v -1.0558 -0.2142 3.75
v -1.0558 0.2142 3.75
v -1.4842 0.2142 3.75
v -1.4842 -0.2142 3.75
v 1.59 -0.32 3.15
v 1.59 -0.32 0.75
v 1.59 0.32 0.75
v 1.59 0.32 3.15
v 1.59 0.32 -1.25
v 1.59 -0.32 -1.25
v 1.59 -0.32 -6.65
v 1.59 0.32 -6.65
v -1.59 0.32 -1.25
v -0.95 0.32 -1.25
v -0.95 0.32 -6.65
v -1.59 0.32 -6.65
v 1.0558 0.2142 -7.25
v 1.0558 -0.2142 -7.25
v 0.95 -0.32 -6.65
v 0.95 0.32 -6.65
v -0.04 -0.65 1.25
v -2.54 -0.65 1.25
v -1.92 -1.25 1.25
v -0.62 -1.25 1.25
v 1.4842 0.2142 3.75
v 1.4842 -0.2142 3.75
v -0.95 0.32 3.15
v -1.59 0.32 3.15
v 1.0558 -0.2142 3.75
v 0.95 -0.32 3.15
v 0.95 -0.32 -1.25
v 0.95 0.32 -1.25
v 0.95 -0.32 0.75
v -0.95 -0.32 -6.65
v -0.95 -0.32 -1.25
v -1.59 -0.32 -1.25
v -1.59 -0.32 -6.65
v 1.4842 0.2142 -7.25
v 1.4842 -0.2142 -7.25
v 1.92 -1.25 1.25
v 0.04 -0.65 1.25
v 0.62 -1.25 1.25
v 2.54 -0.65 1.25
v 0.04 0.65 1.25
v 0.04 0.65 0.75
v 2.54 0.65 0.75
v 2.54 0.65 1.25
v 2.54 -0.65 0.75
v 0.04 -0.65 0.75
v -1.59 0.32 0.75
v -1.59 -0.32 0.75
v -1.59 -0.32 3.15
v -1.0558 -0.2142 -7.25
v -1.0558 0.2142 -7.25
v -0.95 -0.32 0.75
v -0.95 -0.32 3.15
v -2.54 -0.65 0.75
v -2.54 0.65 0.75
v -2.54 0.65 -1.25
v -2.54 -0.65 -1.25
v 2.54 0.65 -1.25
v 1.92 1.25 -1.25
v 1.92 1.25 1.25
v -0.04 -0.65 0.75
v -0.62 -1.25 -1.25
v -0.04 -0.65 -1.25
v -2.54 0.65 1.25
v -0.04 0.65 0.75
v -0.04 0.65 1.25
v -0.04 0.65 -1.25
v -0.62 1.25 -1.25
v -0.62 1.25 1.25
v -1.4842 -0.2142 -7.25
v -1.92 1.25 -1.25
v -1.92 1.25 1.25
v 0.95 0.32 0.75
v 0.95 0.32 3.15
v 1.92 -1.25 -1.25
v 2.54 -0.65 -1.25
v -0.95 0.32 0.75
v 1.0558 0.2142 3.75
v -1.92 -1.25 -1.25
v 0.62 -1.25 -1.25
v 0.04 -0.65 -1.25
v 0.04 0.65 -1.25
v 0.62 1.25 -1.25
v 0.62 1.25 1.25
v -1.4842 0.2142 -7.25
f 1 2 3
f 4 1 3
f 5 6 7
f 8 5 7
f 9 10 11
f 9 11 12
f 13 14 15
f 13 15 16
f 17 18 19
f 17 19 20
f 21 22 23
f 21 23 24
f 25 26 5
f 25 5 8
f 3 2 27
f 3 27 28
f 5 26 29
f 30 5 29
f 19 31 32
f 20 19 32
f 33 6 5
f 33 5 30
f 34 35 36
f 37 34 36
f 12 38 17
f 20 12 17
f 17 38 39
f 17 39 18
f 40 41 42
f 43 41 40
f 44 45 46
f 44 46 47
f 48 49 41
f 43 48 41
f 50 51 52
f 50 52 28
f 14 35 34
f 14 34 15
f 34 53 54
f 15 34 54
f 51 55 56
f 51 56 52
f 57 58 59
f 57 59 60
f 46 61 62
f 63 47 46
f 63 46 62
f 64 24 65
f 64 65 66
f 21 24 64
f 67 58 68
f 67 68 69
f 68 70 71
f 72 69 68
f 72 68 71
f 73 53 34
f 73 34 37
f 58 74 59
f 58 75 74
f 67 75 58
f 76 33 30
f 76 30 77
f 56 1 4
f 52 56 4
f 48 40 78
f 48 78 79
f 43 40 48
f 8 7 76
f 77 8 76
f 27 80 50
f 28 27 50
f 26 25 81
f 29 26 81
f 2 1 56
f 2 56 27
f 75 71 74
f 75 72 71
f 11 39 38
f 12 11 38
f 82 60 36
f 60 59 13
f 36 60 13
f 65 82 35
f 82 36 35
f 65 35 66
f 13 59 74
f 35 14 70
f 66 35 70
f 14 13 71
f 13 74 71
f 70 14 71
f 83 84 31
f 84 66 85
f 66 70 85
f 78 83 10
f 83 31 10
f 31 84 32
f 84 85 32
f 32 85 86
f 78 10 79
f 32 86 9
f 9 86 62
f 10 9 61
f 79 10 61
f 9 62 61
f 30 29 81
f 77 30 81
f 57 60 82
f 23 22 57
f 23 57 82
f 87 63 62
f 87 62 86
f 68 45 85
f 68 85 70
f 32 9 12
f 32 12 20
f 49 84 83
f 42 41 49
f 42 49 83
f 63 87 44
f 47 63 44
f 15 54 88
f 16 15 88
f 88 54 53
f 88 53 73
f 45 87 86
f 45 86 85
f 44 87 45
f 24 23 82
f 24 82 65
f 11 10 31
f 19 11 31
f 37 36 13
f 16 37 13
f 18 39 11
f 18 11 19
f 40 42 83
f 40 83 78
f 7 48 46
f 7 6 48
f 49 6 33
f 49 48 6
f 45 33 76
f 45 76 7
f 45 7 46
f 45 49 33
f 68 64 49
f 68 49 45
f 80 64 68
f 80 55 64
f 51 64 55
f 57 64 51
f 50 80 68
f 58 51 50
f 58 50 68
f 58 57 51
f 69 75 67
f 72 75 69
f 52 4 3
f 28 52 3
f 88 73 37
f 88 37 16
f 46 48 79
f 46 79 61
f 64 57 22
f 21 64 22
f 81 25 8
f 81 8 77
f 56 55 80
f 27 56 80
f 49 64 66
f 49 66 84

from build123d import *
from OCP.BRepFilletAPI import BRepFilletAPI_MakeChamfer

# Parameters (mm, degrees)
EXTRUDE_1_DEPTH     = 1.25
SKETCH_2_W          = 0.5
SKETCH_2_H          = 1.3
CUT_EXTRUDE_1_DEPTH = 6.378791686
SKETCH_3_W          = 0.64
SKETCH_3_H          = 0.64
EXTRUDE_2_DEPTH     = 6
EXTRUDE_START       = -2
SKETCH_3_2_W        = 0.64
SKETCH_3_2_H        = 0.64
EXTRUDE_3_DEPTH     = 3
CHAMFER_1_SIZE      = 0.6
CHAMFER_1_SIZE2     = 0.105796188


with BuildPart() as part:
    # 草图1 → 凸台-拉伸1 (new, symmetric)
    with BuildSketch(Plane.XY):
        Polygon((-1.92, 1.25), (-2.54, 0.65), (-2.54, -0.65), (-1.92, -1.25), (-0.62, -1.25), (-0.04, -0.65), (0.04, -0.65), (0.62, -1.25), (1.92, -1.25), (2.54, -0.65), (2.54, 0.65), (1.92, 1.25), (0.62, 1.25), (0.04, 0.65), (-0.04, 0.65), (-0.62, 1.25), align=None)
    extrude(amount=EXTRUDE_1_DEPTH, both=True)

    # 草图2 → 切除-拉伸1 (cut, through all)
    with BuildSketch(Plane.ZY.offset(2.54)):
        with Locations((1, 0)):
            Rectangle(SKETCH_2_W, SKETCH_2_H)
    extrude(amount=-CUT_EXTRUDE_1_DEPTH, mode=Mode.SUBTRACT)

    # 草图3 → 凸台-拉伸2 (add)
    with BuildSketch(Plane(origin=(0, 0, -1.25), x_dir=(-1, 0, 0), z_dir=(0, 0, -1))):
        with Locations((-1.27, 0)):
            Rectangle(SKETCH_3_W, SKETCH_3_H)
        with Locations((1.27, 0)):
            Rectangle(SKETCH_3_W, SKETCH_3_H)
    extrude(amount=EXTRUDE_2_DEPTH)

    # 草图3<2> → 凸台-拉伸3 (add)
    with BuildSketch(Plane(origin=(0, 0, -1.25), x_dir=(-1, 0, 0), z_dir=(0, 0, -1)).offset(EXTRUDE_START)):
        with Locations((-1.27, 0)):
            Rectangle(SKETCH_3_2_W, SKETCH_3_2_H)
        with Locations((1.27, 0)):
            Rectangle(SKETCH_3_2_W, SKETCH_3_2_H)
    extrude(amount=-EXTRUDE_3_DEPTH)

    # 倒角1: one chamfer whose edges measure the first distance from different faces: ONE call of the kernel's chamfer builder (chamfer() names one face for all edges)
    chamfer_1_edges_1 = [part.edges().sort_by_distance(p)[0] for p in [
        (-1.59, 0, 3.75),
    ]]
    chamfer_1_side_1 = [part.faces().sort_by_distance(p)[0] for p in [
        (-1.59, 0, 2.25),
    ]]
    chamfer_1_edges_2 = [part.edges().sort_by_distance(p)[0] for p in [
        (-1.27, -0.32, 3.75),
    ]]
    chamfer_1_side_2 = [part.faces().sort_by_distance(p)[0] for p in [
        (-1.27, -0.32, 2.25),
    ]]
    chamfer_1_edges_3 = [part.edges().sort_by_distance(p)[0] for p in [
        (-0.95, 0, 3.75),
    ]]
    chamfer_1_side_3 = [part.faces().sort_by_distance(p)[0] for p in [
        (-0.95, 0, 2.25),
    ]]
    chamfer_1_edges_4 = [part.edges().sort_by_distance(p)[0] for p in [
        (-1.27, 0.32, 3.75),
    ]]
    chamfer_1_side_4 = [part.faces().sort_by_distance(p)[0] for p in [
        (-1.27, 0.32, 2.25),
    ]]
    chamfer_1_edges_5 = [part.edges().sort_by_distance(p)[0] for p in [
        (1.59, 0, -7.25),
    ]]
    chamfer_1_side_5 = [part.faces().sort_by_distance(p)[0] for p in [
        (1.59, 0, -4.25),
    ]]
    chamfer_1_edges_6 = [part.edges().sort_by_distance(p)[0] for p in [
        (1.27, -0.32, -7.25),
    ]]
    chamfer_1_side_6 = [part.faces().sort_by_distance(p)[0] for p in [
        (1.27, -0.32, -4.25),
    ]]
    chamfer_1_edges_7 = [part.edges().sort_by_distance(p)[0] for p in [
        (0.95, 0, -7.25),
    ]]
    chamfer_1_side_7 = [part.faces().sort_by_distance(p)[0] for p in [
        (0.95, 0, -4.25),
    ]]
    chamfer_1_edges_8 = [part.edges().sort_by_distance(p)[0] for p in [
        (1.27, 0.32, -7.25),
    ]]
    chamfer_1_side_8 = [part.faces().sort_by_distance(p)[0] for p in [
        (1.27, 0.32, -4.25),
    ]]
    chamfer_1_edges_9 = [part.edges().sort_by_distance(p)[0] for p in [
        (-1.59, 0, -7.25),
    ]]
    chamfer_1_side_9 = [part.faces().sort_by_distance(p)[0] for p in [
        (-1.59, 0, -4.25),
    ]]
    chamfer_1_edges_10 = [part.edges().sort_by_distance(p)[0] for p in [
        (-1.27, 0.32, -7.25),
    ]]
    chamfer_1_side_10 = [part.faces().sort_by_distance(p)[0] for p in [
        (-1.27, 0.32, -4.25),
    ]]
    chamfer_1_edges_11 = [part.edges().sort_by_distance(p)[0] for p in [
        (-0.95, 0, -7.25),
    ]]
    chamfer_1_side_11 = [part.faces().sort_by_distance(p)[0] for p in [
        (-0.95, 0, -4.25),
    ]]
    chamfer_1_edges_12 = [part.edges().sort_by_distance(p)[0] for p in [
        (-1.27, -0.32, -7.25),
    ]]
    chamfer_1_side_12 = [part.faces().sort_by_distance(p)[0] for p in [
        (-1.27, -0.32, -4.25),
    ]]
    chamfer_1_edges_13 = [part.edges().sort_by_distance(p)[0] for p in [
        (1.59, 0, 3.75),
    ]]
    chamfer_1_side_13 = [part.faces().sort_by_distance(p)[0] for p in [
        (1.59, 0, 2.25),
    ]]
    chamfer_1_edges_14 = [part.edges().sort_by_distance(p)[0] for p in [
        (1.27, 0.32, 3.75),
    ]]
    chamfer_1_side_14 = [part.faces().sort_by_distance(p)[0] for p in [
        (1.27, 0.32, 2.25),
    ]]
    chamfer_1_edges_15 = [part.edges().sort_by_distance(p)[0] for p in [
        (0.95, 0, 3.75),
    ]]
    chamfer_1_side_15 = [part.faces().sort_by_distance(p)[0] for p in [
        (0.95, 0, 2.25),
    ]]
    chamfer_1_edges_16 = [part.edges().sort_by_distance(p)[0] for p in [
        (1.27, -0.32, 3.75),
    ]]
    chamfer_1_side_16 = [part.faces().sort_by_distance(p)[0] for p in [
        (1.27, -0.32, 2.25),
    ]]
    chamfer_1 = BRepFilletAPI_MakeChamfer(part.part.solid().wrapped)
    for e in chamfer_1_edges_1:
        chamfer_1.Add(CHAMFER_1_SIZE, CHAMFER_1_SIZE2, e.wrapped, chamfer_1_side_1[0].wrapped)  # the first distance lies on this face
    for e in chamfer_1_edges_2:
        chamfer_1.Add(CHAMFER_1_SIZE, CHAMFER_1_SIZE2, e.wrapped, chamfer_1_side_2[0].wrapped)  # the first distance lies on this face
    for e in chamfer_1_edges_3:
        chamfer_1.Add(CHAMFER_1_SIZE, CHAMFER_1_SIZE2, e.wrapped, chamfer_1_side_3[0].wrapped)  # the first distance lies on this face
    for e in chamfer_1_edges_4:
        chamfer_1.Add(CHAMFER_1_SIZE, CHAMFER_1_SIZE2, e.wrapped, chamfer_1_side_4[0].wrapped)  # the first distance lies on this face
    for e in chamfer_1_edges_5:
        chamfer_1.Add(CHAMFER_1_SIZE, CHAMFER_1_SIZE2, e.wrapped, chamfer_1_side_5[0].wrapped)  # the first distance lies on this face
    for e in chamfer_1_edges_6:
        chamfer_1.Add(CHAMFER_1_SIZE, CHAMFER_1_SIZE2, e.wrapped, chamfer_1_side_6[0].wrapped)  # the first distance lies on this face
    for e in chamfer_1_edges_7:
        chamfer_1.Add(CHAMFER_1_SIZE, CHAMFER_1_SIZE2, e.wrapped, chamfer_1_side_7[0].wrapped)  # the first distance lies on this face
    for e in chamfer_1_edges_8:
        chamfer_1.Add(CHAMFER_1_SIZE, CHAMFER_1_SIZE2, e.wrapped, chamfer_1_side_8[0].wrapped)  # the first distance lies on this face
    for e in chamfer_1_edges_9:
        chamfer_1.Add(CHAMFER_1_SIZE, CHAMFER_1_SIZE2, e.wrapped, chamfer_1_side_9[0].wrapped)  # the first distance lies on this face
    for e in chamfer_1_edges_10:
        chamfer_1.Add(CHAMFER_1_SIZE, CHAMFER_1_SIZE2, e.wrapped, chamfer_1_side_10[0].wrapped)  # the first distance lies on this face
    for e in chamfer_1_edges_11:
        chamfer_1.Add(CHAMFER_1_SIZE, CHAMFER_1_SIZE2, e.wrapped, chamfer_1_side_11[0].wrapped)  # the first distance lies on this face
    for e in chamfer_1_edges_12:
        chamfer_1.Add(CHAMFER_1_SIZE, CHAMFER_1_SIZE2, e.wrapped, chamfer_1_side_12[0].wrapped)  # the first distance lies on this face
    for e in chamfer_1_edges_13:
        chamfer_1.Add(CHAMFER_1_SIZE, CHAMFER_1_SIZE2, e.wrapped, chamfer_1_side_13[0].wrapped)  # the first distance lies on this face
    for e in chamfer_1_edges_14:
        chamfer_1.Add(CHAMFER_1_SIZE, CHAMFER_1_SIZE2, e.wrapped, chamfer_1_side_14[0].wrapped)  # the first distance lies on this face
    for e in chamfer_1_edges_15:
        chamfer_1.Add(CHAMFER_1_SIZE, CHAMFER_1_SIZE2, e.wrapped, chamfer_1_side_15[0].wrapped)  # the first distance lies on this face
    for e in chamfer_1_edges_16:
        chamfer_1.Add(CHAMFER_1_SIZE, CHAMFER_1_SIZE2, e.wrapped, chamfer_1_side_16[0].wrapped)  # the first distance lies on this face
    add(Compound.cast(chamfer_1.Shape()), mode=Mode.REPLACE)


solid = part.part
